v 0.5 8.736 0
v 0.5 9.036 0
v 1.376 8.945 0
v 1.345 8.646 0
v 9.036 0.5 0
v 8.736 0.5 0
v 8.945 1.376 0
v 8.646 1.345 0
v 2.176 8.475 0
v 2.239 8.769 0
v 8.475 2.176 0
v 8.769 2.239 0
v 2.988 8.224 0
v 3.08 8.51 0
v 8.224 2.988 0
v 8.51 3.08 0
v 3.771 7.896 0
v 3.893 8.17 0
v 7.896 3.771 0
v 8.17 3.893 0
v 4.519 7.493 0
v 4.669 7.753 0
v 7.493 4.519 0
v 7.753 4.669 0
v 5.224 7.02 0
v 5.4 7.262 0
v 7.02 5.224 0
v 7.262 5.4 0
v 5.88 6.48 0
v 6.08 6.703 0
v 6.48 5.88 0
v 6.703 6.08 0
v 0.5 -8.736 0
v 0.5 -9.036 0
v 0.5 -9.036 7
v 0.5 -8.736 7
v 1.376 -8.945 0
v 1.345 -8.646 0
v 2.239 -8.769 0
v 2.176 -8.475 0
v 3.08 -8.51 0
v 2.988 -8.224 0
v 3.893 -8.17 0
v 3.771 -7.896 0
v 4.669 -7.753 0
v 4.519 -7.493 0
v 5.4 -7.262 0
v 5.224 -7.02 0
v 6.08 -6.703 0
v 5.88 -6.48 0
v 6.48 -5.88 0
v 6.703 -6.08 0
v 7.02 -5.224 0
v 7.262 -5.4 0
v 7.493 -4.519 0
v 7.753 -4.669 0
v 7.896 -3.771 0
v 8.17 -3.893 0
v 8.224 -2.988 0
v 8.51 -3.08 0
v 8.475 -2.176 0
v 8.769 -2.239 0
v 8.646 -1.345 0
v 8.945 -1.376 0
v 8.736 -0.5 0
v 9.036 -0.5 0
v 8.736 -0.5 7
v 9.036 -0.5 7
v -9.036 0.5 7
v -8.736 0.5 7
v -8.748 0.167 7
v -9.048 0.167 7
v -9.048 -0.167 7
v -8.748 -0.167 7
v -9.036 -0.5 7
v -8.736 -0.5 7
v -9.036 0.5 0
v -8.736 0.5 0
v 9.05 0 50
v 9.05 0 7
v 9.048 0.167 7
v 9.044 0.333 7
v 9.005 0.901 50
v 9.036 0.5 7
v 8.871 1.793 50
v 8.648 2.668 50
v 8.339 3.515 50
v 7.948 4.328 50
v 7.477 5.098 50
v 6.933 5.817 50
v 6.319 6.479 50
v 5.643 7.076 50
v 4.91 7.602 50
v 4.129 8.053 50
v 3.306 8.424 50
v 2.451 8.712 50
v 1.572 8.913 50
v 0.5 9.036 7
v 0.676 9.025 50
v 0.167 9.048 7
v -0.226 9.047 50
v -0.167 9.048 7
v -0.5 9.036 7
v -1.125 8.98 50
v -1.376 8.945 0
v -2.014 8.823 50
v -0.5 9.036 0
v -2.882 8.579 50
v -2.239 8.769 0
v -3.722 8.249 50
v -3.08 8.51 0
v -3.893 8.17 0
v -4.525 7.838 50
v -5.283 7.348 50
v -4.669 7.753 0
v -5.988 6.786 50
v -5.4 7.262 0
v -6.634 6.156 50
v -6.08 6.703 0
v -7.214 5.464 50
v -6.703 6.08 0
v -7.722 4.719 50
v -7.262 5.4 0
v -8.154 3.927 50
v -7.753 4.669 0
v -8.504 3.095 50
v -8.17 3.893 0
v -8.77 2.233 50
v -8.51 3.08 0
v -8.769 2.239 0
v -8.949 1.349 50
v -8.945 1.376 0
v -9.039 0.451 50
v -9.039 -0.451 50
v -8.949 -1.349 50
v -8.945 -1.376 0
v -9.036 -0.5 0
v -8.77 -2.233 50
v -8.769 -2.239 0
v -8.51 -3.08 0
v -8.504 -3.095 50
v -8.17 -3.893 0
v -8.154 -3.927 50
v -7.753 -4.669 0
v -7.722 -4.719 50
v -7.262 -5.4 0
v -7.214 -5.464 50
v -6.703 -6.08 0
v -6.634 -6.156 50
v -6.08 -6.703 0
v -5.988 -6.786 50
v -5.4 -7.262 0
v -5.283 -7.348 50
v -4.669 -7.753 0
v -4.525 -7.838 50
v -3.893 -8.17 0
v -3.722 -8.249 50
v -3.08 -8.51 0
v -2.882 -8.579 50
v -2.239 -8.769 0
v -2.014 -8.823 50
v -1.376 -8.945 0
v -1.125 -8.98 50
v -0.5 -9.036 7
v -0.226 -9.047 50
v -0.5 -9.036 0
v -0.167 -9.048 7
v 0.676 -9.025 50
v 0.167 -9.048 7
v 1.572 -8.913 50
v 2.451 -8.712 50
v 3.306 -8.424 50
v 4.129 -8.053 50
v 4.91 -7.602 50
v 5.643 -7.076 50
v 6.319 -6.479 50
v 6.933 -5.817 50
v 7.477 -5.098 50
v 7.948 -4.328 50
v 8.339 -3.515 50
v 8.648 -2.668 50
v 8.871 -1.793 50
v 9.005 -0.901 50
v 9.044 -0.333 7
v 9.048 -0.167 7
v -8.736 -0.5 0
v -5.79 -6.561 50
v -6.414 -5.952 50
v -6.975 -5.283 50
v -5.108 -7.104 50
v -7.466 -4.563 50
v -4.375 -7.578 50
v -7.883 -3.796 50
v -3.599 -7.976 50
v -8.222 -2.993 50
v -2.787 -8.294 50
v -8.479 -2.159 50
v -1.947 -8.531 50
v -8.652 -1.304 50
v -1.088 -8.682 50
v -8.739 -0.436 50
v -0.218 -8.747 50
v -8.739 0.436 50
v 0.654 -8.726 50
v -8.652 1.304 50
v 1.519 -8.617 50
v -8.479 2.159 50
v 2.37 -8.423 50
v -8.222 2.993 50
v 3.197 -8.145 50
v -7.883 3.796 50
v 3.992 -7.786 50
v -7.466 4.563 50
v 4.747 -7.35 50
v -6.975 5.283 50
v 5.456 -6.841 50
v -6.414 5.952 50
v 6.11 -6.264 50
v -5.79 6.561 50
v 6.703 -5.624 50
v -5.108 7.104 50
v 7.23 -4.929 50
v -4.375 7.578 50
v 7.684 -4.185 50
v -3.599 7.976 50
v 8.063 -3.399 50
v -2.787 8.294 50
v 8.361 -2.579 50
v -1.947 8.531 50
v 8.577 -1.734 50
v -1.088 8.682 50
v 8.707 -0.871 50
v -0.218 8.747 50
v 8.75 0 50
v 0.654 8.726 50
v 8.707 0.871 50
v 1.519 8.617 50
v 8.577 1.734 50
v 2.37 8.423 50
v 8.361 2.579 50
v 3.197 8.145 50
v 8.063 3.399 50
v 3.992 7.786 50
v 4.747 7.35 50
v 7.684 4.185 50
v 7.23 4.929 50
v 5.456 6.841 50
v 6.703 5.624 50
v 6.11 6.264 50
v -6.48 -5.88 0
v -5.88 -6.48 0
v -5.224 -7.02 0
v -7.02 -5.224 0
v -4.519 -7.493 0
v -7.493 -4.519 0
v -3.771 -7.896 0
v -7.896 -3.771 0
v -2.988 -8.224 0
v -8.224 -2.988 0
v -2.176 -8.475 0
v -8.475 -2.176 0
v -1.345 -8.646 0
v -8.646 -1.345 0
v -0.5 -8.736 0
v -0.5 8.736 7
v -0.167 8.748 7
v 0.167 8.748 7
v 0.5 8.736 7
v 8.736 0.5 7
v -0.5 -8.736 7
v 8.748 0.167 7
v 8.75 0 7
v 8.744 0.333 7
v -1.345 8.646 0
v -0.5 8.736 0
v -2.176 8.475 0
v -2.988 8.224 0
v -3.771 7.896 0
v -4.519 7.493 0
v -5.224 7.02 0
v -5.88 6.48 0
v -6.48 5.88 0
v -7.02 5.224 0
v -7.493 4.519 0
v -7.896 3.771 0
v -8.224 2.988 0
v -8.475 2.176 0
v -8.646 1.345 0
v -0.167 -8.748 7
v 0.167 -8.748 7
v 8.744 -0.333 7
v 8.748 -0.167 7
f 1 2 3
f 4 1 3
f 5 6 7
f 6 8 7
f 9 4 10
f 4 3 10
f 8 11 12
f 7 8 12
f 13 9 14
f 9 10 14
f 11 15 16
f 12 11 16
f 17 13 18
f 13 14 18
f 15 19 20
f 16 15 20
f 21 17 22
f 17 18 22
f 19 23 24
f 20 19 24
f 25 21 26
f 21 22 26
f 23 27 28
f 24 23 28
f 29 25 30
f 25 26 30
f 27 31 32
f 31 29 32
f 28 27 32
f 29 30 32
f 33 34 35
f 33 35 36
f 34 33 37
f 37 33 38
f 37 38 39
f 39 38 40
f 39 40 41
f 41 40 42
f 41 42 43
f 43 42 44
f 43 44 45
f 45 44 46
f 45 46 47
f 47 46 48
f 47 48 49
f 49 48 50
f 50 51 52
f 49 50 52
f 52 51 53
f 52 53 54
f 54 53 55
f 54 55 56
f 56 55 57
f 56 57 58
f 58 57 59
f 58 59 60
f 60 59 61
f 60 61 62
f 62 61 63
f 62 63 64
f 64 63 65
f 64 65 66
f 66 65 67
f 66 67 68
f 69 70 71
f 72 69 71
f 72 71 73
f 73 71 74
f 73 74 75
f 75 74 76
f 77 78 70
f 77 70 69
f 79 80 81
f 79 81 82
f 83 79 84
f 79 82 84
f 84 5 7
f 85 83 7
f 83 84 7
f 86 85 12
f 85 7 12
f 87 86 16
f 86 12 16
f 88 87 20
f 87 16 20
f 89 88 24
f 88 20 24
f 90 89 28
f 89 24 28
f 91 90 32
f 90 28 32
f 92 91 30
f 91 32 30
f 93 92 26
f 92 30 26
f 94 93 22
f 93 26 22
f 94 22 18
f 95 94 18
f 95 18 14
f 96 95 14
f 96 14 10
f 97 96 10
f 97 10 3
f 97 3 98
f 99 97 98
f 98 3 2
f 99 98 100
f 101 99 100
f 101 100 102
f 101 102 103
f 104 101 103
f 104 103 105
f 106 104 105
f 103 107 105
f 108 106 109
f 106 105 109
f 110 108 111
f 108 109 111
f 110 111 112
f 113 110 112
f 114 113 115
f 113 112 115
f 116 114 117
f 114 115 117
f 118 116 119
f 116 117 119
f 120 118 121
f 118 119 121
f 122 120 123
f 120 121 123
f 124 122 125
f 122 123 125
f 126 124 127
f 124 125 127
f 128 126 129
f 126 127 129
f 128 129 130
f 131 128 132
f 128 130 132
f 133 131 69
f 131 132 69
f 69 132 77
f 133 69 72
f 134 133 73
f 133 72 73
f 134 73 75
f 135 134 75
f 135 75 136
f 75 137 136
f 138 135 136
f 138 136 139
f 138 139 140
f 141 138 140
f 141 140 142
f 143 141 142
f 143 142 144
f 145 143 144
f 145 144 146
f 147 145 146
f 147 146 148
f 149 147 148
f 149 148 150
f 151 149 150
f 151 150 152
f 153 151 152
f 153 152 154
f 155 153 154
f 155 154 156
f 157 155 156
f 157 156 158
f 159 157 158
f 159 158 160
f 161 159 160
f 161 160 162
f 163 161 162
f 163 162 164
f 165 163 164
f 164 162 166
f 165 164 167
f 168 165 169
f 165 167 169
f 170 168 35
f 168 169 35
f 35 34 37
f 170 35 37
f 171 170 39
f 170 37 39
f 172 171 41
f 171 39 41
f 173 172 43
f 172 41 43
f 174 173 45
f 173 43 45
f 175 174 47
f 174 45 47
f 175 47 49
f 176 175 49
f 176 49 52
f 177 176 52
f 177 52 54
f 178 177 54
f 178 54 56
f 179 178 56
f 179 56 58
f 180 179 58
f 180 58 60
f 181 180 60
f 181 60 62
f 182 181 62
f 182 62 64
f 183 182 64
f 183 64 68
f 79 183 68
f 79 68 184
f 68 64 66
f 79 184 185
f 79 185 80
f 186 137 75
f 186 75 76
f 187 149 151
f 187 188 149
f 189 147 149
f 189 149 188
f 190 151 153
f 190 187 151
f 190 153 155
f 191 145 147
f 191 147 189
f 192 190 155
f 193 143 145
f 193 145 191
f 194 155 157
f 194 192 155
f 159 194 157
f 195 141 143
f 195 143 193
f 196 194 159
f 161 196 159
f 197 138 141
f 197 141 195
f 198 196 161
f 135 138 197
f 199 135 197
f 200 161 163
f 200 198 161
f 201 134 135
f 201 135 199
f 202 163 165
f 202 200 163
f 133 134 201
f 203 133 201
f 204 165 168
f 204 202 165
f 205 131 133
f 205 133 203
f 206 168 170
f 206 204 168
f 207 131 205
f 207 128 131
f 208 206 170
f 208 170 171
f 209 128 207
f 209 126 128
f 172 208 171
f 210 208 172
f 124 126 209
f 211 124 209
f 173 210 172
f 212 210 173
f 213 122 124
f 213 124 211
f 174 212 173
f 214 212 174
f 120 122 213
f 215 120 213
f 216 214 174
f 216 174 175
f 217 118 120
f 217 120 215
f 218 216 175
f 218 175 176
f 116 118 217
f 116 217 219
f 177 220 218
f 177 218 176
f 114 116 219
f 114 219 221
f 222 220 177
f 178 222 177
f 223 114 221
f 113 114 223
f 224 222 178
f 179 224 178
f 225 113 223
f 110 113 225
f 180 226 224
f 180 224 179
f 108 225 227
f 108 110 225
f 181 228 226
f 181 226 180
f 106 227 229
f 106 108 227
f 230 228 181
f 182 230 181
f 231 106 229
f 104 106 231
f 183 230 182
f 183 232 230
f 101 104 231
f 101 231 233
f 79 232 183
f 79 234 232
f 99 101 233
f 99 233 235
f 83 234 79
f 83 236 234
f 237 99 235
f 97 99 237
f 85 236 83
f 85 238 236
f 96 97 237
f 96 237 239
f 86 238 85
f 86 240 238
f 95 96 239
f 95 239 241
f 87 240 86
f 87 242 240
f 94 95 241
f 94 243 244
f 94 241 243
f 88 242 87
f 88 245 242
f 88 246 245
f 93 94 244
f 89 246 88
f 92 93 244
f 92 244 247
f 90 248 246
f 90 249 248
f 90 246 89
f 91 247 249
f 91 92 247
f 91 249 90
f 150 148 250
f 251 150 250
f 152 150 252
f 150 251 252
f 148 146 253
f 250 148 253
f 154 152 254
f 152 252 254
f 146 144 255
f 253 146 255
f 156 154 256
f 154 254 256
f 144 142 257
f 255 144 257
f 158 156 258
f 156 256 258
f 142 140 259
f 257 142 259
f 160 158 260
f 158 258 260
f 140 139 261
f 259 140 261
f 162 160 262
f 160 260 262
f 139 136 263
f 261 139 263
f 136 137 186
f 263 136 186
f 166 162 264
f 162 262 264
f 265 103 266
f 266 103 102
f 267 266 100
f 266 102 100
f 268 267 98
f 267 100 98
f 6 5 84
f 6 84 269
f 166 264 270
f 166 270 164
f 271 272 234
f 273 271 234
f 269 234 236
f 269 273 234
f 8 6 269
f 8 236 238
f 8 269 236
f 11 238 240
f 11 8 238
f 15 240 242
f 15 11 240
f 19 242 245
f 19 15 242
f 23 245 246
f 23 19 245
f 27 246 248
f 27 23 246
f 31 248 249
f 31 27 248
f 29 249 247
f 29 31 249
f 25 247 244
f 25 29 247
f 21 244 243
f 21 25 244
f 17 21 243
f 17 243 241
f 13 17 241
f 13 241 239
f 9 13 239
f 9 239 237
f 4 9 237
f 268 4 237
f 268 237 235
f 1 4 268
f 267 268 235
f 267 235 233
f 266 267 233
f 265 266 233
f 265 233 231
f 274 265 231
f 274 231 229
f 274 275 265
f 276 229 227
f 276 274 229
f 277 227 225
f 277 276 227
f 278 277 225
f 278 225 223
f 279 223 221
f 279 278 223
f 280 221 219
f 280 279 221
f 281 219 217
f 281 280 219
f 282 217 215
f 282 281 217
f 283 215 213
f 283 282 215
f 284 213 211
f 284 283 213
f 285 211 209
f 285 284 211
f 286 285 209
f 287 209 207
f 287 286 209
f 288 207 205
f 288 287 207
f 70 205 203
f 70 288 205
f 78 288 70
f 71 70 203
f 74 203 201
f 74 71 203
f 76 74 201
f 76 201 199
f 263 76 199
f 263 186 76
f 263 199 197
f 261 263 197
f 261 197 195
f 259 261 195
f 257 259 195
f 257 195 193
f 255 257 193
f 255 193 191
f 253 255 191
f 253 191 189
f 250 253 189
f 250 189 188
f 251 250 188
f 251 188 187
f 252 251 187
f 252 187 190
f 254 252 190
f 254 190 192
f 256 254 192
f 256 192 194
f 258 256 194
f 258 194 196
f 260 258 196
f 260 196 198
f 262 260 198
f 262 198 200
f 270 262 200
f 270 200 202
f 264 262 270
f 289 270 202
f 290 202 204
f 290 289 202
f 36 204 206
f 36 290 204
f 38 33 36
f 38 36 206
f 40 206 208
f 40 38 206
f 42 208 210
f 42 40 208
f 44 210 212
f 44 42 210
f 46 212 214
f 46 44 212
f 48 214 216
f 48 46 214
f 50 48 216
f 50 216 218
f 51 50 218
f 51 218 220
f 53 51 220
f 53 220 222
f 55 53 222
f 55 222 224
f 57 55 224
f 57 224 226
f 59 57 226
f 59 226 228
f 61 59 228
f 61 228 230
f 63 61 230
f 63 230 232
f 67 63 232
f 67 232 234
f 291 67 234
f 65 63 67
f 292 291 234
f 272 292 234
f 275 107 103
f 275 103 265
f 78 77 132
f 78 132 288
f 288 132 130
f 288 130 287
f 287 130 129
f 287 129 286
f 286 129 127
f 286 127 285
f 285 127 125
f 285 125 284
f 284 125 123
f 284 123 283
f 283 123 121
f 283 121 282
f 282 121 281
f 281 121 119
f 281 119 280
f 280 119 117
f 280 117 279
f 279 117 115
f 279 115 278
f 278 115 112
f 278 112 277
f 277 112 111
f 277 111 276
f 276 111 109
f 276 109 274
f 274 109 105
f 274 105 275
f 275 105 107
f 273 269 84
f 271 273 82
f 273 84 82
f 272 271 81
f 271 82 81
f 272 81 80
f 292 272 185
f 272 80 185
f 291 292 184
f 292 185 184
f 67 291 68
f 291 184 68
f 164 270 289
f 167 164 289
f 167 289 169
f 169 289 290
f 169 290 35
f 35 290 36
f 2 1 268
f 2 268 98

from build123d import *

# Parameters (mm, degrees)
F0_R     = 9.05
F0_R_2   = 8.75
F1_DEPTH = 50
F2_W     = 1
F2_H     = 9.05
F3_DEPTH = 7
F4_COUNT = 2
F4_ANGLE = 90


with BuildPart() as f1:
    # F0 (on Top) → F1 (new body)
    with BuildSketch(Plane.XY):
        Circle(F0_R)
        Circle(F0_R_2, mode=Mode.SUBTRACT)
    extrude(amount=F1_DEPTH)


with BuildPart() as f3:
    # F2 (on Top) → F3 (new body)
    with BuildSketch(Plane.XY):
        with Locations((0, 4.525)):
            Rectangle(F2_W, F2_H)
        with Locations((0, -4.525)):
            Rectangle(F2_W, F2_H)
    extrude(amount=F3_DEPTH)


with BuildPart() as f4_1:
    # F4: instance of F3
    add(f3.part.rotate(Axis((0, 0, 0), (0, 0, -1)), 1 * F4_ANGLE / (F4_COUNT - 1)))


with BuildPart() as f1_1:
    add(f1.part)

    # F5: cut F3, F4_1
    add(f3.part, mode=Mode.SUBTRACT)
    add(f4_1.part, mode=Mode.SUBTRACT)


solid = f1_1.part
